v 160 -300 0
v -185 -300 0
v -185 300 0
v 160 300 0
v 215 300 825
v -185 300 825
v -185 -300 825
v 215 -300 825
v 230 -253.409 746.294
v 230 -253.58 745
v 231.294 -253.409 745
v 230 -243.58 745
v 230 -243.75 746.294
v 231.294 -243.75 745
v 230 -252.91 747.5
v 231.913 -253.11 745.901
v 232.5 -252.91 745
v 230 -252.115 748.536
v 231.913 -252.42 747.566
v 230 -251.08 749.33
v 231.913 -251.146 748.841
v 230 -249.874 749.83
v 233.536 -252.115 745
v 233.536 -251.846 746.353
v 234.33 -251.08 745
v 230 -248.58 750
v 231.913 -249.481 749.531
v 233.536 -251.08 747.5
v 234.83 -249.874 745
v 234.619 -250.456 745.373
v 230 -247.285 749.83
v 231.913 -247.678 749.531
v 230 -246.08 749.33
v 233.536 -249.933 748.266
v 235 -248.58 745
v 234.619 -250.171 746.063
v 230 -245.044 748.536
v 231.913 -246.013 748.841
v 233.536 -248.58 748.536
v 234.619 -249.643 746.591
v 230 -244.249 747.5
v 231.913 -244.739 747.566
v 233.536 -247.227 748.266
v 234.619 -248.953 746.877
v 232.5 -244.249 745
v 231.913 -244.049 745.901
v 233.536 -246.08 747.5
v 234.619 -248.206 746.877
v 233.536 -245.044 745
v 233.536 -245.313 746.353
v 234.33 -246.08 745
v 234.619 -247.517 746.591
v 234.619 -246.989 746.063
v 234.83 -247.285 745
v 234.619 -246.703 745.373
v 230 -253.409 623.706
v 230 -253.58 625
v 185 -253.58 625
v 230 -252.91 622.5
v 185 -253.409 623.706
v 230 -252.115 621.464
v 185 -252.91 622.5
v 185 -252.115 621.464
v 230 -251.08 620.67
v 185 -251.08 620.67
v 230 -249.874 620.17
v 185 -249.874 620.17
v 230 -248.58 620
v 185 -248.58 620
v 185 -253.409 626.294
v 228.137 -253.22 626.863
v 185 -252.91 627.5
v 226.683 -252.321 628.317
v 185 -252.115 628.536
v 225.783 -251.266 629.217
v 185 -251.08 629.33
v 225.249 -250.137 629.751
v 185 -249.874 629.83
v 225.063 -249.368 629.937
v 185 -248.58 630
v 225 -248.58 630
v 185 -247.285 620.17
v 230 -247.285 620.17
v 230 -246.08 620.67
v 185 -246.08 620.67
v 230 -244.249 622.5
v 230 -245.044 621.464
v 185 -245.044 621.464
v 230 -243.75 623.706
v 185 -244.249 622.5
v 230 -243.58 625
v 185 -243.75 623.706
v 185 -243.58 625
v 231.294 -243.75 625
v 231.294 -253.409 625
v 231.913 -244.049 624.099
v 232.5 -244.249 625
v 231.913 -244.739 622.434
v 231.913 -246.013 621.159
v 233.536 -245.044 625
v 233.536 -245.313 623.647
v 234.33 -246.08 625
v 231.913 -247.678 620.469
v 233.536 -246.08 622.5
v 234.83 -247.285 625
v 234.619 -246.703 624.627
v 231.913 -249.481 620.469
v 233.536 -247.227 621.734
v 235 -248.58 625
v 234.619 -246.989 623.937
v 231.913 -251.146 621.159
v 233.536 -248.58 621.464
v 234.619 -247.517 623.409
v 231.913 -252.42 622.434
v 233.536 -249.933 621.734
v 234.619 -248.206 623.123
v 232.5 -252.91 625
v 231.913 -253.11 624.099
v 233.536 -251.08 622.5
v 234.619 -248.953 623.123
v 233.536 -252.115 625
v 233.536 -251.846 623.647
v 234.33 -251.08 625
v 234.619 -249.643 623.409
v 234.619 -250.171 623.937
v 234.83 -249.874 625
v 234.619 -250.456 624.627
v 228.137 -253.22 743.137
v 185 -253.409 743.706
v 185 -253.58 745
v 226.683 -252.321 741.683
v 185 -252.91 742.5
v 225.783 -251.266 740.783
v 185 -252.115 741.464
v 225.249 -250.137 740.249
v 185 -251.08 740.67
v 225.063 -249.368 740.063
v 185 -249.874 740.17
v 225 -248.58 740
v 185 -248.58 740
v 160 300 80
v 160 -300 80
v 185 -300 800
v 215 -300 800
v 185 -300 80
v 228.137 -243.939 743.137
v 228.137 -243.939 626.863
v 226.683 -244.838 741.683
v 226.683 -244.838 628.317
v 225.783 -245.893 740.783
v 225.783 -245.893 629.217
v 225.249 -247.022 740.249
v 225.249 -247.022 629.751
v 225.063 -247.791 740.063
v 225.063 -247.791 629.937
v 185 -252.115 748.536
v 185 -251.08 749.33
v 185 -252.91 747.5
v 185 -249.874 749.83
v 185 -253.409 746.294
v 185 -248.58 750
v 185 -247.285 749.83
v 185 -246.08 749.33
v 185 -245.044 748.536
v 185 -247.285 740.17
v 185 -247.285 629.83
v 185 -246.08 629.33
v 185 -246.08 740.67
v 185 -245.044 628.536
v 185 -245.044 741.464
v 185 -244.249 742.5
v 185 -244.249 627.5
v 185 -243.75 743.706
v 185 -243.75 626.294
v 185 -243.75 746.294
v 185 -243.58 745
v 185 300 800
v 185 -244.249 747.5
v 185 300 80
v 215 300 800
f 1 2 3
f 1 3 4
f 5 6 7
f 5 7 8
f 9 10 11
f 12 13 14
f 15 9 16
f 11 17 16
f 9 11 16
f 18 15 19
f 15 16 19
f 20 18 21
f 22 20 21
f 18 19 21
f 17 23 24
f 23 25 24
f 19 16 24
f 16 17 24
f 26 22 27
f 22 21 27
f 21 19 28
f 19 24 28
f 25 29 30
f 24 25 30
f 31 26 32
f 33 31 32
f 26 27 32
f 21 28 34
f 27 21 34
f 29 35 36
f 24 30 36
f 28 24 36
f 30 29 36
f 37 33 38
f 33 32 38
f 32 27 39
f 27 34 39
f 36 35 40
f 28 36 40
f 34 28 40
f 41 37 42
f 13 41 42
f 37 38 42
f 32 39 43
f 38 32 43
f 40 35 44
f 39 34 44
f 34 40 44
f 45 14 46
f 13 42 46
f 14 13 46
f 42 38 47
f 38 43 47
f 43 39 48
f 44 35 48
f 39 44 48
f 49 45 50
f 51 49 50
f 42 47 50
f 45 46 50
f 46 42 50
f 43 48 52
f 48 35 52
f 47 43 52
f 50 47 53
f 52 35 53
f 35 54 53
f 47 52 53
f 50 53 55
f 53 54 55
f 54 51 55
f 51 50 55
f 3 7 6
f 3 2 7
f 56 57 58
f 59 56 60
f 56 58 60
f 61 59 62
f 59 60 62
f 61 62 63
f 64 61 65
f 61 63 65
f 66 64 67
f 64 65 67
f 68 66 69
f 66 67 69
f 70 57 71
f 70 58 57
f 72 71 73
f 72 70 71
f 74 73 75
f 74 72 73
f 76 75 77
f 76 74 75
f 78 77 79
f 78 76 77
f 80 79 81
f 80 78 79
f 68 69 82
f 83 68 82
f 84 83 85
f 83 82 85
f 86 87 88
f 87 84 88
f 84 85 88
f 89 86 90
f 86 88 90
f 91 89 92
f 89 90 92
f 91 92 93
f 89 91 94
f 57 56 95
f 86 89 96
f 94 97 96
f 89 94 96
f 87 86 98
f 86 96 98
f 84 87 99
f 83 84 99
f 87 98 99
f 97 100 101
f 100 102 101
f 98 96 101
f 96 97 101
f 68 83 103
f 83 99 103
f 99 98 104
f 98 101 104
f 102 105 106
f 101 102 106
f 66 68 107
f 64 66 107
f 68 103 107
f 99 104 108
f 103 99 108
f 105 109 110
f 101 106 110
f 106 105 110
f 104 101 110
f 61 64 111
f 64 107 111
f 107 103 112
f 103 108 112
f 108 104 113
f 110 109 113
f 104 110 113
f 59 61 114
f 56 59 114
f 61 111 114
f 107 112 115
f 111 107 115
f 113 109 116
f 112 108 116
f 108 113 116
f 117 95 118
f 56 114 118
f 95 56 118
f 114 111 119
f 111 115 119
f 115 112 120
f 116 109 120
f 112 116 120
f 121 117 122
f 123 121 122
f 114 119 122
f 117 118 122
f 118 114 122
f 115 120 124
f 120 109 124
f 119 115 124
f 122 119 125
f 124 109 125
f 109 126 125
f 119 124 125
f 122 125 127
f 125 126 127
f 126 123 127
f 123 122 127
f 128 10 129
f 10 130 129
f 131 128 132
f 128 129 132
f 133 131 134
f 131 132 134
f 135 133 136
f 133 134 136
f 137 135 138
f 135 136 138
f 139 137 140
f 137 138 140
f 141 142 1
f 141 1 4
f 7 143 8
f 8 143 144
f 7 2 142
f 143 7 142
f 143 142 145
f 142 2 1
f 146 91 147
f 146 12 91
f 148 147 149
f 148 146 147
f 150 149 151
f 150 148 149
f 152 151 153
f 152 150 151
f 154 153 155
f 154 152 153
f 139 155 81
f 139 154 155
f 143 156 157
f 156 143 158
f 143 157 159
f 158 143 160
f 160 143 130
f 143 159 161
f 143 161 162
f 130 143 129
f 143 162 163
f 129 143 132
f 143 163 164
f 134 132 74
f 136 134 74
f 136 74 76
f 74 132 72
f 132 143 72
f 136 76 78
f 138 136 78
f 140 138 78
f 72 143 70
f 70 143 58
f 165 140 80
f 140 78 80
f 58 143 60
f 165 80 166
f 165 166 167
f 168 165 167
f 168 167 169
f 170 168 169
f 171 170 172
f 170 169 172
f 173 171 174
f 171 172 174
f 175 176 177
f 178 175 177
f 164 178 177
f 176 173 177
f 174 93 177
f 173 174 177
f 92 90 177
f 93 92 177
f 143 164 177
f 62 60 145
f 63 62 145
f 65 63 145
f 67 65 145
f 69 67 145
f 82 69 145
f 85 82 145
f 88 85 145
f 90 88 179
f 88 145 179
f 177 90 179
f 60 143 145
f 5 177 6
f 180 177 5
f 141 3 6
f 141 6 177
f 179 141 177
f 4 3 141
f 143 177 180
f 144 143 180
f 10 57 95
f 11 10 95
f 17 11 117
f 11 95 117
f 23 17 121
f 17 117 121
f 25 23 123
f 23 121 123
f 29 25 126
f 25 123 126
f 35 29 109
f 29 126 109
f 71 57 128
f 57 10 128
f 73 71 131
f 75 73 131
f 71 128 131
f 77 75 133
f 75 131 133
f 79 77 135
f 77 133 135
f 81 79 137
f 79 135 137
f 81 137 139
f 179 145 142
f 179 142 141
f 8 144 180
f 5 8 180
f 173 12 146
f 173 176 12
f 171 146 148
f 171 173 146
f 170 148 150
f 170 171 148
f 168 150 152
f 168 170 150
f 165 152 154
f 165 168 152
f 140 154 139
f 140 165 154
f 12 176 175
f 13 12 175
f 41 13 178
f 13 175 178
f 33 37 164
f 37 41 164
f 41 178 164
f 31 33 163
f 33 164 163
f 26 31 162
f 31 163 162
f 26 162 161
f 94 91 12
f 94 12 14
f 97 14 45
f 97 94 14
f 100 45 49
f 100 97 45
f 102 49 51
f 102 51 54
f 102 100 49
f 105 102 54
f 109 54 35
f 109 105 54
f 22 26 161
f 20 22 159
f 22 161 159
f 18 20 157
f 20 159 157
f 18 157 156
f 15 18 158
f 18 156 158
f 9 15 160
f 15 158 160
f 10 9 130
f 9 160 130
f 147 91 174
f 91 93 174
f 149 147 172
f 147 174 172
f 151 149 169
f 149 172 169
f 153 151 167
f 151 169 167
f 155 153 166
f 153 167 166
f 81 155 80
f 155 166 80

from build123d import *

# Parameters (mm, degrees)
F0_W        = 370
F0_H        = 600
F1_DEPTH    = 800
F2_W        = 600
F2_H        = 80
F3_DEPTH    = 25
F5_DEPTH    = 50
F6_T1_DEPTH = 120
F6_T4_ANGLE = 180
F6_T6_ANGLE = 180
F7_W        = 40
F7_H        = 110
F8_DEPTH    = 25
F9_R        = 4.99999
F10_W       = 400
F10_H       = 600
F11_DEPTH   = 25


# Not quite as in the source:
# - a fillet or chamfer that OpenCascade refuses, or shapes differently, is made with other operations: its cross-section is extruded or revolved along the edge and cut away or added
# - a fillet or chamfer is up to 0.001 mm smaller than in the source, because OpenCascade refuses the exact size


with BuildPart() as f1:
    # F0 (on Top) → F1 (new body)
    with BuildSketch(Plane.XY):
        Rectangle(F0_W, F0_H)
    extrude(amount=F1_DEPTH)

    # F2 (on face) → F3 (cut)
    with BuildSketch(Plane.YZ.offset(185)):
        with Locations((0, 40)):
            Rectangle(F2_W, F2_H)
    extrude(amount=-F3_DEPTH, mode=Mode.SUBTRACT)

    # F4 (on face) → F5 (join)
    with BuildSketch(Plane.YZ.offset(185)):
        with BuildLine():
            ThreePointArc((-248.5795542598, 750), (-252.1150881657, 748.5355339059), (-253.5795542598, 745))
            Line((-253.5795542598, 745), (-253.5795542598, 625))
            ThreePointArc((-253.5795542598, 625), (-252.1150881657, 621.4644660941), (-248.5795542598, 620))
            ThreePointArc((-248.5795542598, 620), (-245.0440203538, 621.4644660941), (-243.5795542598, 625))
            Line((-243.5795542598, 625), (-243.5795542598, 745))
            ThreePointArc((-243.5795542598, 745), (-245.0440203538, 748.5355339059), (-248.5795542598, 750))
        make_face()
    extrude(amount=F5_DEPTH)

    # F6: fillet of radius 5 on 4 edges, made by hand

    # F6_s2 → F6_t1 (cut)
    with BuildSketch(Plane.XY.offset(625)):
        with BuildLine():
            ThreePointArc((230, -253.5795542598), (233.5355339059, -252.1150881657), (235, -248.5795542598))
            Line((235, -248.5795542598), (235, -253.5795542598))
            Line((235, -253.5795542598), (230, -253.5795542598))
        make_face()
        with BuildLine():
            ThreePointArc((230, -243.5795542598), (233.5355339059, -245.0440203538), (235, -248.5795542598))
            Line((235, -248.5795542598), (235, -243.5795542598))
            Line((235, -243.5795542598), (230, -243.5795542598))
        make_face()
    extrude(amount=F6_T1_DEPTH, mode=Mode.SUBTRACT)

    # F6_s3 → F6_t4 (revolve, cut)
    with BuildSketch(Plane.XY.offset(745)):
        with BuildLine():
            ThreePointArc((230, -253.5795542598), (233.5355339059, -252.1150881657), (235, -248.5795542598))
            Line((235, -248.5795542598), (235, -253.5795542598))
            Line((235, -253.5795542598), (230, -253.5795542598))
        make_face()
    revolve(axis=Axis((235, -248.5795542598, 745), (-1, 0, 0)), revolution_arc=F6_T4_ANGLE, mode=Mode.SUBTRACT)

    # F6_s5 → F6_t6 (revolve, cut)
    with BuildSketch(Plane.XY.offset(625)):
        with BuildLine():
            ThreePointArc((230, -243.5795542598), (233.5355339059, -245.0440203538), (235, -248.5795542598))
            Line((235, -248.5795542598), (235, -243.5795542598))
            Line((235, -243.5795542598), (230, -243.5795542598))
        make_face()
    revolve(axis=Axis((235, -248.5795542598, 625), (-1, 0, 0)), revolution_arc=F6_T6_ANGLE, mode=Mode.SUBTRACT)

    # F7 (on face) → F8 (cut)
    with BuildSketch(Plane(origin=(0, -243.5795542598, 0), x_dir=(-1, 0, 0), z_dir=(0, 1, 0))):
        with Locations((-205, 685)):
            Rectangle(F7_W, F7_H)
    extrude(amount=-F8_DEPTH, mode=Mode.SUBTRACT)

    # F9 (radius 5 in the source; OpenCascade refuses exactly that, so slightly less here)
    f9_edges = [f1.edges().sort_by_distance(p)[0] for p in [
        (205, -243.579554, 740),
        (225, -243.579554, 685),
        (205, -243.579554, 630),
        (205, -253.579554, 740),
        (225, -253.579554, 685),
        (205, -253.579554, 630),
    ]]
    fillet(f9_edges, radius=F9_R)

    # F10 (on face) → F11 (join)
    with BuildSketch(Plane.XY.offset(800)):
        with Locations((15, 0)):
            Rectangle(F10_W, F10_H)
    extrude(amount=F11_DEPTH)


solid = f1.part
